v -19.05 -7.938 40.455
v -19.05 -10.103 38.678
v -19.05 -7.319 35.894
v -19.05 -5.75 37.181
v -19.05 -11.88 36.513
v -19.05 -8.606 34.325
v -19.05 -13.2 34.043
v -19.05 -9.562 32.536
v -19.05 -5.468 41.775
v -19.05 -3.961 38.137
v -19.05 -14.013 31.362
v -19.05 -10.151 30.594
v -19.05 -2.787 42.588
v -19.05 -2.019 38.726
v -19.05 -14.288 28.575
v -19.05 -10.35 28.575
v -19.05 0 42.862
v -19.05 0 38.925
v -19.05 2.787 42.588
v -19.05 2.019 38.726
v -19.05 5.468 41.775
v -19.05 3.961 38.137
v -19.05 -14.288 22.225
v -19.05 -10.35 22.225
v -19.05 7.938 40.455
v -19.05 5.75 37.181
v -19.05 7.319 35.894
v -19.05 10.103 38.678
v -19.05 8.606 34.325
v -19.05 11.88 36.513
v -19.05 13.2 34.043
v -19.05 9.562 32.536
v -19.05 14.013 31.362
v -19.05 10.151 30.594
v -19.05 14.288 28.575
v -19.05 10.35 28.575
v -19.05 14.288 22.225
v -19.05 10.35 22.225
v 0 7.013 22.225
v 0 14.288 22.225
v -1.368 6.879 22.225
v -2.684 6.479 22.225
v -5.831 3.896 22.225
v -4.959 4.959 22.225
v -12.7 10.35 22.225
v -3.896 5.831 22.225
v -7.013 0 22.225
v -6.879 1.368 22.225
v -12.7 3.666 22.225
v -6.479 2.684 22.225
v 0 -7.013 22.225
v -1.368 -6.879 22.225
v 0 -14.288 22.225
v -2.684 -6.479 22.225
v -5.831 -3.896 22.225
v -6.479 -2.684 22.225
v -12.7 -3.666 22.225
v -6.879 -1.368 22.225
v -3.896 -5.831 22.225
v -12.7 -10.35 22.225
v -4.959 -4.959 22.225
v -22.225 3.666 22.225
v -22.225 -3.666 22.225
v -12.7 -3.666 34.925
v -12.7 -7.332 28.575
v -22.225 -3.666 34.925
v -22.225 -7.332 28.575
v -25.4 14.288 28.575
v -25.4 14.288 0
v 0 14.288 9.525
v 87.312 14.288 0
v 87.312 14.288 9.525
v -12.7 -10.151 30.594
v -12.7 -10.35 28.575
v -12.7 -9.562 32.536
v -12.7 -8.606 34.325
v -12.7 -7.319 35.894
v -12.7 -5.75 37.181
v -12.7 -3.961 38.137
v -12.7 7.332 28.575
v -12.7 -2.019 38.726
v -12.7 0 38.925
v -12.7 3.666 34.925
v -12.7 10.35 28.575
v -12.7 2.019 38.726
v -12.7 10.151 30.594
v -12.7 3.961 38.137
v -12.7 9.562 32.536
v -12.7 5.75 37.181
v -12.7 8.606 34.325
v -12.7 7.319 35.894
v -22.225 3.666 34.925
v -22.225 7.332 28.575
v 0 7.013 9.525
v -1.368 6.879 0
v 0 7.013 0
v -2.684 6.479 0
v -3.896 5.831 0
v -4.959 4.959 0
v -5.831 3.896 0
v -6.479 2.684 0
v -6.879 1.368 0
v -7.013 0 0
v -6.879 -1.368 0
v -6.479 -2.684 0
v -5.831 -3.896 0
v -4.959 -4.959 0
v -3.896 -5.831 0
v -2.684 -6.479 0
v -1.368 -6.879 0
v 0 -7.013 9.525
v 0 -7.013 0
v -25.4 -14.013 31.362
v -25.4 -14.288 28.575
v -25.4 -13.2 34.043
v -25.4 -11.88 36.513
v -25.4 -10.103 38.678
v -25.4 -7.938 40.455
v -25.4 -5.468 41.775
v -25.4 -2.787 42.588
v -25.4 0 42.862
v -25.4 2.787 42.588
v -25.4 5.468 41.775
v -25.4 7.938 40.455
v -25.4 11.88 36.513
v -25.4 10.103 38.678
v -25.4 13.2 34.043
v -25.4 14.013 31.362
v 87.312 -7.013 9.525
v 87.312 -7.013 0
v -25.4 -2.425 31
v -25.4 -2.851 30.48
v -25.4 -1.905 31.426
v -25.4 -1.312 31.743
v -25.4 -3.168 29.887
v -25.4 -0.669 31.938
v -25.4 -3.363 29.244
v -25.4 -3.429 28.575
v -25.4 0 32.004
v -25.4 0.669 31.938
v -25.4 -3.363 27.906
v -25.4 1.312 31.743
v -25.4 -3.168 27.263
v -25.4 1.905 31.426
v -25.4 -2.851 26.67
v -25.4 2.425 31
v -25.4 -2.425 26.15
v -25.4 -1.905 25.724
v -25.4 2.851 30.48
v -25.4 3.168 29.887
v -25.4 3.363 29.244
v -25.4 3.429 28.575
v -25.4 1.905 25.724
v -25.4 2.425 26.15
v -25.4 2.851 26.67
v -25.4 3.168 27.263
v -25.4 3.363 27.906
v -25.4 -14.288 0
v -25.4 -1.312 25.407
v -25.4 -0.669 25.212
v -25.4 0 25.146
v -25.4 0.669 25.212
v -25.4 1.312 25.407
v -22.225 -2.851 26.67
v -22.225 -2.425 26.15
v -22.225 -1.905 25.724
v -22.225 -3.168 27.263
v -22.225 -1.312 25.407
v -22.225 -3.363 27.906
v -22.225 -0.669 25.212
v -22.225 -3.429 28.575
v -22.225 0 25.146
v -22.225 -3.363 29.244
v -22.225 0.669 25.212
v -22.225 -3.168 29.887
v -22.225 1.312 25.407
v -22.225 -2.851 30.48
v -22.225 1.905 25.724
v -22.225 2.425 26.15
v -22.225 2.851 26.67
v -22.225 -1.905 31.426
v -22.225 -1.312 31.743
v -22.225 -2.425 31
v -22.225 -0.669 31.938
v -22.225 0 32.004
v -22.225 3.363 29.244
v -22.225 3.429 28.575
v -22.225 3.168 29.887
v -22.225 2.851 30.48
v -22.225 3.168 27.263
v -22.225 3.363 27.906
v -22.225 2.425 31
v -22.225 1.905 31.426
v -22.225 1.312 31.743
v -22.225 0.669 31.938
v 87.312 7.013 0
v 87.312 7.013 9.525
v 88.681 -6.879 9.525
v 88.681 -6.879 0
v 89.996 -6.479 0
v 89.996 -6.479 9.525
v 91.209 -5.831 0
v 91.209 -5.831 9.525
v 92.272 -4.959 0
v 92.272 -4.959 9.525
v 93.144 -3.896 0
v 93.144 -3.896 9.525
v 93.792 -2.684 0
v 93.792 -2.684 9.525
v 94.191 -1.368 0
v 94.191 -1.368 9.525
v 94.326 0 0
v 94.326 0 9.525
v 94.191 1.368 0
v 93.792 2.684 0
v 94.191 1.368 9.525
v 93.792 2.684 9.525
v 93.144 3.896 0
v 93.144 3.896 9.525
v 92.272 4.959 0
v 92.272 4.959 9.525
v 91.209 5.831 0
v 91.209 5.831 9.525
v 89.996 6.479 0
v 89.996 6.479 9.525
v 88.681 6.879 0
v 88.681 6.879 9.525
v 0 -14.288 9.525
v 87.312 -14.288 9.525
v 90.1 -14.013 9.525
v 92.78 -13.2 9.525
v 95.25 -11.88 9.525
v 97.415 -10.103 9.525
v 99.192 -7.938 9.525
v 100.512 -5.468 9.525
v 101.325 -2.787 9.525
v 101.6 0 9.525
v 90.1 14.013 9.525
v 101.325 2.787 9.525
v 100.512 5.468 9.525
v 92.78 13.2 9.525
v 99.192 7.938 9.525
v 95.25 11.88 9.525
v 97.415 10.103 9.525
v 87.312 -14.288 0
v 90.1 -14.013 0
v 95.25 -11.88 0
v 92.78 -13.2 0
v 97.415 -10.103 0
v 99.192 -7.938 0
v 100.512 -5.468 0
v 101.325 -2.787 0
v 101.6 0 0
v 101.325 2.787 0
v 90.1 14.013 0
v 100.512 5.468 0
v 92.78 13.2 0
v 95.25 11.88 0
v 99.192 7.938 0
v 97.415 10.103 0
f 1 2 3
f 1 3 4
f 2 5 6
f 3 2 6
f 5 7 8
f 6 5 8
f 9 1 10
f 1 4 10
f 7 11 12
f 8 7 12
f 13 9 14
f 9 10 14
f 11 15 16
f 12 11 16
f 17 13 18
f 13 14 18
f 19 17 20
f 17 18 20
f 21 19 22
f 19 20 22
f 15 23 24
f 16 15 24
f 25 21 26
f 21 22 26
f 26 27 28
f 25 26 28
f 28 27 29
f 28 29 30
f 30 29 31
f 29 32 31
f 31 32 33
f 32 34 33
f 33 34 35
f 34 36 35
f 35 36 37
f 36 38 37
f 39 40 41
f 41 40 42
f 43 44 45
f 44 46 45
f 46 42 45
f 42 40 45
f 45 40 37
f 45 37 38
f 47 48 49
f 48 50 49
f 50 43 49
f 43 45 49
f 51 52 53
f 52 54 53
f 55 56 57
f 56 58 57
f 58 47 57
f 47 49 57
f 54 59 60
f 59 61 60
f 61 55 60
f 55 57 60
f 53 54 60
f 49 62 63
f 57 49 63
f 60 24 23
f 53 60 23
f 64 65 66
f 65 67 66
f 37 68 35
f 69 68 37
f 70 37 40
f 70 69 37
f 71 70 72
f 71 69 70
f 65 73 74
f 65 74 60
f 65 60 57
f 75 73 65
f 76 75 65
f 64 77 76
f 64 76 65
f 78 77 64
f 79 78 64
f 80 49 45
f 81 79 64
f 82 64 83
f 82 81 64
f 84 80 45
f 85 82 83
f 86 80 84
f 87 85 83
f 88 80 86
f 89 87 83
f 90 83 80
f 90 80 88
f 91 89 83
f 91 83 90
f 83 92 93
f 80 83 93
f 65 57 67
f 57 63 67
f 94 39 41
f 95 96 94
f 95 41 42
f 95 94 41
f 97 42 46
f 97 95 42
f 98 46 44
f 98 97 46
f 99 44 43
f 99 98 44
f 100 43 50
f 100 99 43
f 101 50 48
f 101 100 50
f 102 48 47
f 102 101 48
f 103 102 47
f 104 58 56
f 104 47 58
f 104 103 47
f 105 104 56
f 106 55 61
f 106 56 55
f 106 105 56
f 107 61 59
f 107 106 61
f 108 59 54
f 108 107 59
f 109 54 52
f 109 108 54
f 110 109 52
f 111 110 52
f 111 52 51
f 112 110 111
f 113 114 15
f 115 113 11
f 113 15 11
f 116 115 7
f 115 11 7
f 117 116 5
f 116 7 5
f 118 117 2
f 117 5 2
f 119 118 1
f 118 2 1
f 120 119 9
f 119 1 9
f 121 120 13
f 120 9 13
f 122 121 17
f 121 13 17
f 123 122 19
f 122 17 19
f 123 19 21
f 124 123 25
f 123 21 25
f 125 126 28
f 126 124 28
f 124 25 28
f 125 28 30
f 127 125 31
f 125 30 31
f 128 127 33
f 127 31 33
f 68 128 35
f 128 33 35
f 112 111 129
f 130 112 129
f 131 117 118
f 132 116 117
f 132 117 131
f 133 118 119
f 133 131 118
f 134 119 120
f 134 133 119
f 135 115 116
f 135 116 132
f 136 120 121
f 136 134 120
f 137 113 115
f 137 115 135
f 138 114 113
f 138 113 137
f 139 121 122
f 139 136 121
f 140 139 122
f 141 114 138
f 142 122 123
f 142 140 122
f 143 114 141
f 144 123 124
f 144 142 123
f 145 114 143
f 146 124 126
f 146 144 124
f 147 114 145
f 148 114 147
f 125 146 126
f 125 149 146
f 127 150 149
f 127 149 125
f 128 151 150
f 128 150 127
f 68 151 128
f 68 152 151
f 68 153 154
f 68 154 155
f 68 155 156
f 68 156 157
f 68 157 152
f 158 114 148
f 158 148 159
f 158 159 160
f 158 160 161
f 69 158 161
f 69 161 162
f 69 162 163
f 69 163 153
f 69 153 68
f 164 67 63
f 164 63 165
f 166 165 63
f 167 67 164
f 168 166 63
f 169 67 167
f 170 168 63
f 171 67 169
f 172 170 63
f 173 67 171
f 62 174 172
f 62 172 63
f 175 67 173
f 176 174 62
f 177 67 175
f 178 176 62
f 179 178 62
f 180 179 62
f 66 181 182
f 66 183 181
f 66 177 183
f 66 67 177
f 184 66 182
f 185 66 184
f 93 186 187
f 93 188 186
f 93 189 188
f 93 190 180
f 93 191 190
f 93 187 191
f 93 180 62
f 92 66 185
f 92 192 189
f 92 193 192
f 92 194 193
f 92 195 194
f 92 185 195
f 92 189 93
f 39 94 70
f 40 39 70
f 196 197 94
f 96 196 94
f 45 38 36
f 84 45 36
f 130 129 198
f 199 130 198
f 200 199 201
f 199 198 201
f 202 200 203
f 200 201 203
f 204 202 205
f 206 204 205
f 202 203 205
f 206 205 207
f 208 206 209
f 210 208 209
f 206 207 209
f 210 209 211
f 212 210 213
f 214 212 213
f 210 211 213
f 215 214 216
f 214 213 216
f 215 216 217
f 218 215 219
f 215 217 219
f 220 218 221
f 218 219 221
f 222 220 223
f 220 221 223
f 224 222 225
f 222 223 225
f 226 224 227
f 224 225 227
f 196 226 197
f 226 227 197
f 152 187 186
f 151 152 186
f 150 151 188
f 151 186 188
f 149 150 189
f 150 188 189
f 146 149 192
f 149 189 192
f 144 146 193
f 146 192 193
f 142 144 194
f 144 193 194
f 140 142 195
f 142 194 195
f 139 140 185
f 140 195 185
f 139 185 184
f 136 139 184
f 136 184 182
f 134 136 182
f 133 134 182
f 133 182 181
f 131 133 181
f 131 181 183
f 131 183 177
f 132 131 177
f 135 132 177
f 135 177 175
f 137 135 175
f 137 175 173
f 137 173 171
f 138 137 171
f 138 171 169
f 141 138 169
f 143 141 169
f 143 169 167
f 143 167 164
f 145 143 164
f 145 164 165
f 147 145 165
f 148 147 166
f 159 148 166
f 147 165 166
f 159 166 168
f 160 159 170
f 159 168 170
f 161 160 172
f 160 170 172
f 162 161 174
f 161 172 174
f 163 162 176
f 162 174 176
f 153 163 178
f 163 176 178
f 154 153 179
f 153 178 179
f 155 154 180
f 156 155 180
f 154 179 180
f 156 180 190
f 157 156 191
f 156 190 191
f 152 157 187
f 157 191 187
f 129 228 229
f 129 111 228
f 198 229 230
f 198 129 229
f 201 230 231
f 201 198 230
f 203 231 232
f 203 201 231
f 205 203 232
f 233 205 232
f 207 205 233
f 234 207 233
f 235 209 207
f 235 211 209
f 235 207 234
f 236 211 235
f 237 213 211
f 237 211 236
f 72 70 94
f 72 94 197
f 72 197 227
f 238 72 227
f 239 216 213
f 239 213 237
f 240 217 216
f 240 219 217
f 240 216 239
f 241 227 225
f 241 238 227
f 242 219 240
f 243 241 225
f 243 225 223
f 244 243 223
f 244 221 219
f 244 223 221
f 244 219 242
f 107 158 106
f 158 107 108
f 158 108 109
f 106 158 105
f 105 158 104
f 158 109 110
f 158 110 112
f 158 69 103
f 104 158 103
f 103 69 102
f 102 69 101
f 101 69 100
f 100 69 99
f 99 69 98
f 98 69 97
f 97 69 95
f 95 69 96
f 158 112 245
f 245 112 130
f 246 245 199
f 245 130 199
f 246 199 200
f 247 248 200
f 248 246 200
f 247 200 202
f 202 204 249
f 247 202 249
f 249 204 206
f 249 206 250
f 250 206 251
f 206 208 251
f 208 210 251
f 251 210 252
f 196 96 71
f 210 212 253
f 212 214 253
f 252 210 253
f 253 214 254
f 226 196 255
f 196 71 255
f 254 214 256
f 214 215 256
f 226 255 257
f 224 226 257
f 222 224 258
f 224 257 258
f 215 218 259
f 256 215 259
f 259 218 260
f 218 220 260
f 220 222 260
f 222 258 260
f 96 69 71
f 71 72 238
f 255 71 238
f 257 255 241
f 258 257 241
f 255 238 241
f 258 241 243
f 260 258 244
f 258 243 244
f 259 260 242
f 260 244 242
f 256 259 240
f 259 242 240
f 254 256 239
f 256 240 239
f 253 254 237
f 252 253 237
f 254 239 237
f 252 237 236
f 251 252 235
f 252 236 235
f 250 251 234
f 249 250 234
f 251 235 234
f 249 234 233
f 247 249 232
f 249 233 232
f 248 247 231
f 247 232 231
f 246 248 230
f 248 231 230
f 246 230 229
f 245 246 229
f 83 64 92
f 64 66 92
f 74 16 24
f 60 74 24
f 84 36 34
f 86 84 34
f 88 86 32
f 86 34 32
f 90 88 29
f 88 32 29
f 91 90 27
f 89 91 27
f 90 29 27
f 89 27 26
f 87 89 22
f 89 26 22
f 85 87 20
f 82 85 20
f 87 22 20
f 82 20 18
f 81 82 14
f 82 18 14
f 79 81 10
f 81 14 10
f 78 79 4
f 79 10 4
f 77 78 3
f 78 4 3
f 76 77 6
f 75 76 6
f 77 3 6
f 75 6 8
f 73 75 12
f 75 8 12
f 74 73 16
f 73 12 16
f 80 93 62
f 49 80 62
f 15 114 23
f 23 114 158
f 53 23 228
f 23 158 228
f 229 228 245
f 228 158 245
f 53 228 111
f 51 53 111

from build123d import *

# Parameters (mm, degrees)
F1_DEPTH       = 9.525
F2_W           = 25.4
F2_H           = 28.575
F3_DEPTH       = 12.7
F4_W           = 6.35
F4_H           = 28.575
F5_DEPTH       = 25.4
F7_DEPTH       = 6.35
F8_R           = 3.429
F9_DEPTH       = 25.4
F11_DEPTH      = 25.4
F11_DEPTH_BACK = 25.4
F13_DEPTH      = 3.175


with BuildPart() as f1:
    # F0 (on Top) → F1 (new body)
    with BuildSketch(Plane.XY):
        Polygon((101.6, 14.2875), (0, 14.2875), (-25.4, 14.2875), (-25.4, -14.2875), (0, -14.2875), (101.6, -14.2875), align=None)
    extrude(amount=F1_DEPTH)

    # F2 (on face) → F3 (join)
    with BuildSketch(Plane.XY.offset(9.525)):
        with Locations((-12.7, 0)):
            Rectangle(F2_W, F2_H)
    extrude(amount=F3_DEPTH)

    # F4 (on face) → F5 (join)
    with BuildSketch(Plane.XY.offset(22.225)):
        with Locations((-22.225, 0)):
            Rectangle(F4_W, F4_H)
    extrude(amount=F5_DEPTH)

    # F6 (on face) → F7 (join)
    with BuildSketch(Plane.YZ.offset(-19.05)):
        with BuildLine():
            Line((10.3502472592, 17.0163675877), (10.3502472592, 28.575))
            ThreePointArc((10.3502472592, 28.575), (0, 38.9252472592), (-10.3502472592, 28.575))
            Line((-10.3502472592, 28.575), (-10.3502472592, 17.0163675877))
            Line((-10.3502472592, 17.0163675877), (10.3502472592, 17.0163675877))
        make_face()
        Polygon((7.3323484187, 28.575), (3.6661742094, 22.225), (-3.6661742094, 22.225), (-7.3323484187, 28.575), (-3.6661742094, 34.925), (3.6661742094, 34.925), align=None, mode=Mode.SUBTRACT)
    extrude(amount=F7_DEPTH)

    # F8 (on face) → F9 (cut)
    with BuildSketch(Plane.YZ.offset(-19.05)):
        with BuildLine():
            Line((-14.2875, 47.625), (-14.2875, 28.575))
            ThreePointArc((-14.2875, 28.575), (0, 42.8625), (14.2875, 28.575))
            Line((14.2875, 28.575), (14.2875, 47.625))
            Line((14.2875, 47.625), (-14.2875, 47.625))
        make_face()
        with Locations((0, 28.575)):
            Circle(F8_R)
    extrude(amount=-F9_DEPTH, mode=Mode.SUBTRACT)

    # F10 (on face) → F11 (cut, two sides)
    with BuildSketch(Plane.XY.offset(9.525)) as f11_sk:
        with BuildLine():
            Line((87.3125, 7.0132897794), (0, 7.0132897794))
            ThreePointArc((0, 7.0132897794), (-7.0132897794, 0), (0, -7.0132897794))
            Line((0, -7.0132897794), (87.3125, -7.0132897794))
            ThreePointArc((87.3125, -7.0132897794), (94.3257897794, 0), (87.3125, 7.0132897794))
        make_face()
        with BuildLine():
            Line((103.5399436951, 14.2875), (87.3125, 14.2875))
            ThreePointArc((87.3125, 14.2875), (101.6, 0), (87.3125, -14.2875))
            Line((87.3125, -14.2875), (103.5399436951, -17.2526948154))
            Line((103.5399436951, -17.2526948154), (103.5399436951, 14.2875))
        make_face()
    extrude(amount=-F11_DEPTH, mode=Mode.SUBTRACT)
    extrude(f11_sk.sketch, amount=F11_DEPTH_BACK, mode=Mode.SUBTRACT)

    # F12 (on face) → F13 (cut)
    with BuildSketch(Plane.YZ.offset(-19.05)):
        Polygon((3.6661742094, 22.225), (7.3323484187, 28.575), (3.6661742094, 34.925), (-3.6661742094, 34.925), (-7.3323484187, 28.575), (-3.6661742094, 22.225), align=None)
    extrude(amount=-F13_DEPTH, mode=Mode.SUBTRACT)


solid = f1.part
